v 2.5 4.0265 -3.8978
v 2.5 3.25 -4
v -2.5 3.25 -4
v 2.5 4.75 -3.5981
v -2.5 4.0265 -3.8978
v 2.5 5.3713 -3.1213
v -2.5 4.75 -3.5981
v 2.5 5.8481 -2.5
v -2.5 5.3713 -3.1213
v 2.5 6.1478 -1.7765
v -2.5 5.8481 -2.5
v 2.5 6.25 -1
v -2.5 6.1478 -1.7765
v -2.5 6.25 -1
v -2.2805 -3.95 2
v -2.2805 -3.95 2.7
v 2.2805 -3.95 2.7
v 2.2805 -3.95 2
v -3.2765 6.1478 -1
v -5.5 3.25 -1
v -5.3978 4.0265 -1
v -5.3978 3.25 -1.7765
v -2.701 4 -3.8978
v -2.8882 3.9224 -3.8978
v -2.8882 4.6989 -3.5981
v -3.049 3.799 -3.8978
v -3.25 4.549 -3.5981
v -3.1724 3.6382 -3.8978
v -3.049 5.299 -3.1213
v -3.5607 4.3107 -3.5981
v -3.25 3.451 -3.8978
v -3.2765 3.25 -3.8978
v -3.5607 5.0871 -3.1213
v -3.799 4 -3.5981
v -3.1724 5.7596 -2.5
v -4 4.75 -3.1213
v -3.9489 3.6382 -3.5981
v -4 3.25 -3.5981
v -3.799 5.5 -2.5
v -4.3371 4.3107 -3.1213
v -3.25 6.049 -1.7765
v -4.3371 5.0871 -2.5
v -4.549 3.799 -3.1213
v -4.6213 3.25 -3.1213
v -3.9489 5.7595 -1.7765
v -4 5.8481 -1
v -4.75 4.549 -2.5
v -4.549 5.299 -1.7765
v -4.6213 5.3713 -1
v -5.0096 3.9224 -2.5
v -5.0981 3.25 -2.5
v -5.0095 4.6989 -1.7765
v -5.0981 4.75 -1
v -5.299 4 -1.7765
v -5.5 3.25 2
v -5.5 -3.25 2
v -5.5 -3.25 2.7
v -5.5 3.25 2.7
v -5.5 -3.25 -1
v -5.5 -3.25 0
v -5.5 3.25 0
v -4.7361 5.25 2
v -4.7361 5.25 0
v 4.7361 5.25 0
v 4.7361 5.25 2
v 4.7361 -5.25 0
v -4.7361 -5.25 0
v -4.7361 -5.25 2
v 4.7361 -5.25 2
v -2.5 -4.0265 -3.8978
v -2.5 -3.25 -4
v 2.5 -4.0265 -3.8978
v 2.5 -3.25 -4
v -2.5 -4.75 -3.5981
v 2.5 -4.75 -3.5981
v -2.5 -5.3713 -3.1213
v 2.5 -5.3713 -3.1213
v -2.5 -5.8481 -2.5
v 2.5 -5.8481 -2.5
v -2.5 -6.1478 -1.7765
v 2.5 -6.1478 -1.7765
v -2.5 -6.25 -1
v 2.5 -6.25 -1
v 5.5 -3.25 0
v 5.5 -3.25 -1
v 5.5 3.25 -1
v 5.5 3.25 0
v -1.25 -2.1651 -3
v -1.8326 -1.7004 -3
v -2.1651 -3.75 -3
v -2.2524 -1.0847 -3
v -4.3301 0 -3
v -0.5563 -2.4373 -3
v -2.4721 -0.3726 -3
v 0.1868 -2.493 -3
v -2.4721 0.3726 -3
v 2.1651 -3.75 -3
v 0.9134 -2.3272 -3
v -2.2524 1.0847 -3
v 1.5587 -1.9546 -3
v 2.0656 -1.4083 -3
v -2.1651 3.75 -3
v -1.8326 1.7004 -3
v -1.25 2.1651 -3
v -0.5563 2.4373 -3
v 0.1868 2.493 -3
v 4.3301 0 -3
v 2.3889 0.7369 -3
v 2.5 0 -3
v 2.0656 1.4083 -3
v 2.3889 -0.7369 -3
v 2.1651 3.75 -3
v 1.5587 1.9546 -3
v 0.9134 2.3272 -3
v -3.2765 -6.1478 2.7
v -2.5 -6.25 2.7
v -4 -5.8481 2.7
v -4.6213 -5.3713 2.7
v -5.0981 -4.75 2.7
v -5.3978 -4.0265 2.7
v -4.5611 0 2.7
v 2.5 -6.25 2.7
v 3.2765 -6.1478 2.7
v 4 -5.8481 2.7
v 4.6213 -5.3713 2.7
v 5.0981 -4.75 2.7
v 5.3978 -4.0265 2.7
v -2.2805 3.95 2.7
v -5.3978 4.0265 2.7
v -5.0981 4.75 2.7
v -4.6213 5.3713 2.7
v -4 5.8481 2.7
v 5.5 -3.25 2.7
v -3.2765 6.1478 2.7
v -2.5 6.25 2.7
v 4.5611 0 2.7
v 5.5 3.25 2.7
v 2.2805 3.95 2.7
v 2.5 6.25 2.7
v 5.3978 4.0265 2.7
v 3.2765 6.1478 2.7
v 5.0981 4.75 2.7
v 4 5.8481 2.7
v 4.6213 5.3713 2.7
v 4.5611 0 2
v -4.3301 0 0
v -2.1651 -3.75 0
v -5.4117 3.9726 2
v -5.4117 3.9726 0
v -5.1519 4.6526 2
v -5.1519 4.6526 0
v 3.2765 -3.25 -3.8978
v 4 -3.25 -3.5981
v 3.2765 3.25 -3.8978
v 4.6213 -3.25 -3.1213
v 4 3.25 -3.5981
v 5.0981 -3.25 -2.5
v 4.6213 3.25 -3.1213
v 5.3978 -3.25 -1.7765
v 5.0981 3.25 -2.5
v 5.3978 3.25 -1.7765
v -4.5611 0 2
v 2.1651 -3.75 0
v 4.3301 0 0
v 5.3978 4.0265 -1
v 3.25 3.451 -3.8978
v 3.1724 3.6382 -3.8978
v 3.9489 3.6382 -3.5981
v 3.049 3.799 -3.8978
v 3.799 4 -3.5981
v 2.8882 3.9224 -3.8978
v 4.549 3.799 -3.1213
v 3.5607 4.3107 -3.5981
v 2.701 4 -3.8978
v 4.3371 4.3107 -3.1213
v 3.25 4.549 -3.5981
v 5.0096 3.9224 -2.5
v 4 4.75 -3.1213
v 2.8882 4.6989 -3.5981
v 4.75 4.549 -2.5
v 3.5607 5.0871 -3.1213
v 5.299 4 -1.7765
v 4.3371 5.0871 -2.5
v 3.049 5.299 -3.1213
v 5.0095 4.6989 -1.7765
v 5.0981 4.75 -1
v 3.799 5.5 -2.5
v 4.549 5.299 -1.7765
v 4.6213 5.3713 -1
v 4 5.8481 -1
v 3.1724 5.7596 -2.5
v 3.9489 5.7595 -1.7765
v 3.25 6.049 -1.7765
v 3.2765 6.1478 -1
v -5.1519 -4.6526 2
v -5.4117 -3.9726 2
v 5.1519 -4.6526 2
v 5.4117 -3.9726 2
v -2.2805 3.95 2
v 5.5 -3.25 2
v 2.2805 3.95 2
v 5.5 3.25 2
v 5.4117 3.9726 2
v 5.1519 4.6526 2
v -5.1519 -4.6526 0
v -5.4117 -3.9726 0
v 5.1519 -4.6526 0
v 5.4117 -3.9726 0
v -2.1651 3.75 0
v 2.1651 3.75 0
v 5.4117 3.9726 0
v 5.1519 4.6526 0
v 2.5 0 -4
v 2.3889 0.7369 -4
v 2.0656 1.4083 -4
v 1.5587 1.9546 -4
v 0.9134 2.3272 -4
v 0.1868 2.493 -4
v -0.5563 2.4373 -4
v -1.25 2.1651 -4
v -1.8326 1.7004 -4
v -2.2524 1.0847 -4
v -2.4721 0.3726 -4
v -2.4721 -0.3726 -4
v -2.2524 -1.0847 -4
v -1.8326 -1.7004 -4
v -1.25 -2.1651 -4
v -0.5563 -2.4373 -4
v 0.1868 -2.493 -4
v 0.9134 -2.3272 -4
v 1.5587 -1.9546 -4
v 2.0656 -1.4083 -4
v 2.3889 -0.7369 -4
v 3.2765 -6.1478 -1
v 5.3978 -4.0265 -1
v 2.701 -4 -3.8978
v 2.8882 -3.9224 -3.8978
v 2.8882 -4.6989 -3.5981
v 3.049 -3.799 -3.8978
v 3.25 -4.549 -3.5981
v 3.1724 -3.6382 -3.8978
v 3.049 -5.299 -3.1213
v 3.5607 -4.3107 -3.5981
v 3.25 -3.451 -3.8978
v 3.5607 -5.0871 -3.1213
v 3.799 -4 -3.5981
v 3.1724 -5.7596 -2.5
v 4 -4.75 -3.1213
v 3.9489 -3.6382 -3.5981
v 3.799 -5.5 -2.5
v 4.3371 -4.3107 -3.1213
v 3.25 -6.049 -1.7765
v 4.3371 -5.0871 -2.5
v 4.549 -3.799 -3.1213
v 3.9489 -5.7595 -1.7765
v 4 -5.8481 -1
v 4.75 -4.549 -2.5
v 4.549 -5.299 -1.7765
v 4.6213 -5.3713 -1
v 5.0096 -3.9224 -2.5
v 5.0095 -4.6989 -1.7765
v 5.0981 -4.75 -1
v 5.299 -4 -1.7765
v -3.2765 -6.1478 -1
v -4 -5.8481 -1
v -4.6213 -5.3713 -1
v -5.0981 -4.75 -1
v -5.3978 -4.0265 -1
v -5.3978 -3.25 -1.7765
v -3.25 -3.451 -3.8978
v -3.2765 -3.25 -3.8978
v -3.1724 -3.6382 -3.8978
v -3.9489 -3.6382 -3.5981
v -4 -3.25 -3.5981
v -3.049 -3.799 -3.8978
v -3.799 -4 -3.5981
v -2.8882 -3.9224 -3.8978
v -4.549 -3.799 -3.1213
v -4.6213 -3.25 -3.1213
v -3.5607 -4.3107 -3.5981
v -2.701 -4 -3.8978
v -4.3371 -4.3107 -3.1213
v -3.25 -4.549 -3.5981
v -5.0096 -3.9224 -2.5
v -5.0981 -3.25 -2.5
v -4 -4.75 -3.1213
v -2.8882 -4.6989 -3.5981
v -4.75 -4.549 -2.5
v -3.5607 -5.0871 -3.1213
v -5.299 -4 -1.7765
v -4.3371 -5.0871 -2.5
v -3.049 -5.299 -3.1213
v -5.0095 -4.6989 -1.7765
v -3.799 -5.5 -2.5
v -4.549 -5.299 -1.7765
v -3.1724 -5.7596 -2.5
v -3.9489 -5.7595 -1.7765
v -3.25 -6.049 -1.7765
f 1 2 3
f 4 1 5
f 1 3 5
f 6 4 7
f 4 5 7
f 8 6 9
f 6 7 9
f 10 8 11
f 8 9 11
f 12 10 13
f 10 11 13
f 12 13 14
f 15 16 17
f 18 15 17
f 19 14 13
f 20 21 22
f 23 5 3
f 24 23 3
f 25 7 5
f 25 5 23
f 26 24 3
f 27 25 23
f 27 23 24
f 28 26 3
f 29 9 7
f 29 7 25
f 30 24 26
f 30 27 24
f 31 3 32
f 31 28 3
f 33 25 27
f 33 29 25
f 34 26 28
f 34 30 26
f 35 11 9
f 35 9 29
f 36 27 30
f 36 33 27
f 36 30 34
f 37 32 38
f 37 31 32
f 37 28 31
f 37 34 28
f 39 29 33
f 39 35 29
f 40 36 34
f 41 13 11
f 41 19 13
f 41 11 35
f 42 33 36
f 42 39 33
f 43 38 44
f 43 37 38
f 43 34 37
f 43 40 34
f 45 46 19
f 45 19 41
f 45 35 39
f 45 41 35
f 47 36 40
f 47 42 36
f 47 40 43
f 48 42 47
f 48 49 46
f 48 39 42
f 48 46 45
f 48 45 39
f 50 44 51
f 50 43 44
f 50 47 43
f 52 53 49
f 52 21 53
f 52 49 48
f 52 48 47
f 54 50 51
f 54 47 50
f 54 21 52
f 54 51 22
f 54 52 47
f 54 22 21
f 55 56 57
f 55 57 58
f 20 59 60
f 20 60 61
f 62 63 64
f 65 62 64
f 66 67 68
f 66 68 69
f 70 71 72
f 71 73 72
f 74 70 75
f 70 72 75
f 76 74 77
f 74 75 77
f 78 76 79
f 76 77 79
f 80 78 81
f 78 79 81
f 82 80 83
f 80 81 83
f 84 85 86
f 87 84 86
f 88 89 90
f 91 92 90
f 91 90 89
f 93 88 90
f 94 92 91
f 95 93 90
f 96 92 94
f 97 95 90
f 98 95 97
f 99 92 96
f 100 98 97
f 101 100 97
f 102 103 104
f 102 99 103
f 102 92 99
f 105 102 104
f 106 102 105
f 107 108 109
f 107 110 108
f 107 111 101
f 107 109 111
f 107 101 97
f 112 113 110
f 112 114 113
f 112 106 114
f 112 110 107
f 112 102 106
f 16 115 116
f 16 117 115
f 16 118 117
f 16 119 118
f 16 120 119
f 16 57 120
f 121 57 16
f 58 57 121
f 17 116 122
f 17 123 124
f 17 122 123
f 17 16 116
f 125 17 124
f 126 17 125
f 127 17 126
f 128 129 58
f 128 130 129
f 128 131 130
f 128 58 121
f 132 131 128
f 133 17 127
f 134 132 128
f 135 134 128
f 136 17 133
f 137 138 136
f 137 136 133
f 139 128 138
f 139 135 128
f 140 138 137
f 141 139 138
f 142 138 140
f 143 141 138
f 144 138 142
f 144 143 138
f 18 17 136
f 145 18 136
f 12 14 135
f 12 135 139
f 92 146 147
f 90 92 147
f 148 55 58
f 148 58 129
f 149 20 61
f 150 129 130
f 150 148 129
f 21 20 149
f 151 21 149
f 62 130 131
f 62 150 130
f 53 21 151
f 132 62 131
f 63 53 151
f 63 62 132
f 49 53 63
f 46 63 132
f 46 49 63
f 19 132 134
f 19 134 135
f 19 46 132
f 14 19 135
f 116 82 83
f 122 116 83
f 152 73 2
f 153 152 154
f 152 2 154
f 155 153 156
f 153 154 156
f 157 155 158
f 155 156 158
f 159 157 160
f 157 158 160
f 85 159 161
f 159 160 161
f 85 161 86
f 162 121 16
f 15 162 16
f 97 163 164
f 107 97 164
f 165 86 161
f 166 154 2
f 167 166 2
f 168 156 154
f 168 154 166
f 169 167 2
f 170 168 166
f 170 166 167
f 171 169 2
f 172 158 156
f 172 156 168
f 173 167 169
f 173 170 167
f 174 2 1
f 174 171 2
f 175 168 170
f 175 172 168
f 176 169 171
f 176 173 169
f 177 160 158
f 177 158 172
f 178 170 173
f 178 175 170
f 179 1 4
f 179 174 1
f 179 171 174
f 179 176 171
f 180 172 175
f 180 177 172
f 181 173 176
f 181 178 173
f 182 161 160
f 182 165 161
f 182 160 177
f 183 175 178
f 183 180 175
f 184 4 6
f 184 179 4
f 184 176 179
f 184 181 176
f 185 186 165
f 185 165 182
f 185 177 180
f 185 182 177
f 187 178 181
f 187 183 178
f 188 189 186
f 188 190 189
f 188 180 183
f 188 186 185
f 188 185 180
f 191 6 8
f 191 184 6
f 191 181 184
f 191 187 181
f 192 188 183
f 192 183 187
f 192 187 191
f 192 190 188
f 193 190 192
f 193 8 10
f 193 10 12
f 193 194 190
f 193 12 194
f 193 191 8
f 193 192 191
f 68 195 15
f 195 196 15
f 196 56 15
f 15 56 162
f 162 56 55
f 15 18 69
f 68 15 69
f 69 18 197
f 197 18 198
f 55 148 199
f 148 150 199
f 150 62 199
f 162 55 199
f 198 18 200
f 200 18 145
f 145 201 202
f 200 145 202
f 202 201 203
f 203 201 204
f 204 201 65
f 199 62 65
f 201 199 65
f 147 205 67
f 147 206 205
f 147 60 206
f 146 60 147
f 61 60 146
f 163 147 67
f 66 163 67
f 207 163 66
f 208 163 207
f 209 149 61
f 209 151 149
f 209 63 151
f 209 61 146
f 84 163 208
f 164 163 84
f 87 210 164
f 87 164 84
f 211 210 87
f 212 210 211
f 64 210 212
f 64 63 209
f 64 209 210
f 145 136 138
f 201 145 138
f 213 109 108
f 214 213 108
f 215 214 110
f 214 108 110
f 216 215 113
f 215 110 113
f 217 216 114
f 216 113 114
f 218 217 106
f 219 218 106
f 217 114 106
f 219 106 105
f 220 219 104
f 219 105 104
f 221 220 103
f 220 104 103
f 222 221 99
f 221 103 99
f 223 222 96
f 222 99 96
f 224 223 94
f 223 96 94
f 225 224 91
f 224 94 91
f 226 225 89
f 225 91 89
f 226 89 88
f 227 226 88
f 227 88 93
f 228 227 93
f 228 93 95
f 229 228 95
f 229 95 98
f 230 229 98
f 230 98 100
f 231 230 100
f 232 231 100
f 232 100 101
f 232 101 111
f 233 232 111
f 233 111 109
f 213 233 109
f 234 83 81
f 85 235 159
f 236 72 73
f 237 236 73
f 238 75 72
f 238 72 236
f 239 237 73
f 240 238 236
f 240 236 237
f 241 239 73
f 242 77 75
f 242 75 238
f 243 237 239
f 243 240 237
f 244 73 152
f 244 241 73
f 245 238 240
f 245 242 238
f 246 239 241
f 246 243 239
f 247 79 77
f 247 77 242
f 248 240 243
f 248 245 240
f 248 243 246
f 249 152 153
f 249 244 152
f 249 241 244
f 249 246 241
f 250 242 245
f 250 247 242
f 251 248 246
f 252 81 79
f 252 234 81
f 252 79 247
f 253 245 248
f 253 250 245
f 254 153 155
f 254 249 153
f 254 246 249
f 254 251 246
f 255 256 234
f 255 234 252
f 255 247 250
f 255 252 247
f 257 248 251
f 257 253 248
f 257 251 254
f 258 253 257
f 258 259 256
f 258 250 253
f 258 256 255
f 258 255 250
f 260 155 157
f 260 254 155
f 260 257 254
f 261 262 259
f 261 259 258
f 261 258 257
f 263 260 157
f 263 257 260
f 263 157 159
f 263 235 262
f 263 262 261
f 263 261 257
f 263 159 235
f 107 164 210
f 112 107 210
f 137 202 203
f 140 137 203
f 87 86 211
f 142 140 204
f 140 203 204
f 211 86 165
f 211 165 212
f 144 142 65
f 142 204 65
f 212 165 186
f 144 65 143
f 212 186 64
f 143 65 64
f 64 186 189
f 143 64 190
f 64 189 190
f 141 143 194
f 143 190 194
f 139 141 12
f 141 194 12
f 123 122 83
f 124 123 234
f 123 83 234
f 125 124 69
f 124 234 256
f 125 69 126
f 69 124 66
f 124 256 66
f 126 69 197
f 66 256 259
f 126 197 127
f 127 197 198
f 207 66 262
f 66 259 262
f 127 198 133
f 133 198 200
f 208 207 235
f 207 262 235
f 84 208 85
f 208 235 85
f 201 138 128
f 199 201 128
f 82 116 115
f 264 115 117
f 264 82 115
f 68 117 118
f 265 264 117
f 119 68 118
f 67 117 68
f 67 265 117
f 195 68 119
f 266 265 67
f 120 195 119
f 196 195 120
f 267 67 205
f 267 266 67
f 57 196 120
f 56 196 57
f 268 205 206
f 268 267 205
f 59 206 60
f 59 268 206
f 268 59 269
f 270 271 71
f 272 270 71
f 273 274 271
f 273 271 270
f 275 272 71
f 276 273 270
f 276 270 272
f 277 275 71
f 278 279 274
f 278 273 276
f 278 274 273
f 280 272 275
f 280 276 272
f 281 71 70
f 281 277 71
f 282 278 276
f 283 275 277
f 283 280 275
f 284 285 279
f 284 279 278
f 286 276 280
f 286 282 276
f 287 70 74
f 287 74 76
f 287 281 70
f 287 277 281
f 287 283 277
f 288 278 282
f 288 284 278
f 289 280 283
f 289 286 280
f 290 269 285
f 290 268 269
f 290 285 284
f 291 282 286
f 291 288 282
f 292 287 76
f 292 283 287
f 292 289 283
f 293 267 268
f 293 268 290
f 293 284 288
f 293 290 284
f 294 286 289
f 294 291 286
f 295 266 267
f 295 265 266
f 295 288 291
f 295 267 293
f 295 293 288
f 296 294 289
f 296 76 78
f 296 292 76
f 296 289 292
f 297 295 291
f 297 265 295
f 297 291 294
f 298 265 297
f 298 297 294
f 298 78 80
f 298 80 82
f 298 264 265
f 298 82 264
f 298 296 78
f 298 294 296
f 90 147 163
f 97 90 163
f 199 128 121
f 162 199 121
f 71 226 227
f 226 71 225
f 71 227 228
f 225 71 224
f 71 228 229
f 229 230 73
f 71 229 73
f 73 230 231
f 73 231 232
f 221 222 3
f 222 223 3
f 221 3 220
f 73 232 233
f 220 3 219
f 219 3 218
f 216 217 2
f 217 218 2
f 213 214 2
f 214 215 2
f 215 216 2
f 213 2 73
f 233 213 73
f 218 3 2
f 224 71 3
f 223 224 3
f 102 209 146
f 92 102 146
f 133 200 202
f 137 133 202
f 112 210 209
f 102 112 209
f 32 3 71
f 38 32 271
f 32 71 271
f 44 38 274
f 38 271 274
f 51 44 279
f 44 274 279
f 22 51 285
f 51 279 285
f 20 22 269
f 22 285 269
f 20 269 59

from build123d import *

# Parameters (mm, degrees)
F0_W        = 11
F0_H        = 12.5
F0_R        = 2.5
F1_DEPTH    = 4
F2_R        = 2.5
F3_DEPTH    = 3
F4_W        = 11
F4_H        = 1
F5_DEPTH    = 2
F6_W        = 11
F6_H        = 12.5
F7_DEPTH    = 0.7
F8_DEPTH    = 25
F9_T1_DEPTH = 21.7
F11_DEPTH   = 2
F12_R       = 2.99999


# Not quite as in the source:
# - a fillet or chamfer that OpenCascade refuses, or shapes differently, is made with other operations: its cross-section is extruded or revolved along the edge and cut away or added
# - a fillet or chamfer is up to 0.001 mm smaller than in the source, because OpenCascade refuses the exact size


with BuildPart() as f1:
    # F0 (on Top) → F1 (new body)
    with BuildSketch(Plane.XY):
        Rectangle(F0_W, F0_H)
        Circle(F0_R, mode=Mode.SUBTRACT)
    extrude(amount=-F1_DEPTH)

    # F2 (on Top) → F3 (cut)
    with BuildSketch(Plane.XY):
        Polygon((2.1650635095, 3.75), (-2.1650635095, 3.75), (-4.3301270189, 0), (-2.1650635095, -3.75), (2.1650635095, -3.75), (4.3301270189, 0), align=None)
        Circle(F2_R, mode=Mode.SUBTRACT)
    extrude(amount=-F3_DEPTH, mode=Mode.SUBTRACT)

    # F4 (on face) → F5 (join)
    with BuildSketch(Plane.XY):
        with Locations((0, 5.75)):
            Rectangle(F4_W, F4_H)
        with Locations((0, -5.75)):
            Rectangle(F4_W, F4_H)
    extrude(amount=F5_DEPTH)

    # F6 (on face) → F7 (join)
    with BuildSketch(Plane.XY.offset(2)):
        Rectangle(F6_W, F6_H)
    extrude(amount=F7_DEPTH)

    # F2 (on Top) → F8 (cut)
    with BuildSketch(Plane.XY):
        Polygon((2.1650635095, 3.75), (-2.1650635095, 3.75), (-4.3301270189, 0), (-2.1650635095, -3.75), (2.1650635095, -3.75), (4.3301270189, 0), align=None)
        Circle(F2_R, mode=Mode.SUBTRACT)
        Circle(F2_R)
    extrude(amount=F8_DEPTH, mode=Mode.SUBTRACT)

    # F9: fillet of radius 3 on 4 edges, made by hand

    # F9_s2 → F9_t1 (cut)
    with BuildSketch(Plane.XY.offset(-11.5)):
        with BuildLine():
            ThreePointArc((-2.5, -6.25), (-4.6213203436, -5.3713203436), (-5.5, -3.25))
            Line((-5.5, -3.25), (-5.5, -6.25))
            Line((-5.5, -6.25), (-2.5, -6.25))
        make_face()
        with BuildLine():
            ThreePointArc((2.5, -6.25), (4.6213203436, -5.3713203436), (5.5, -3.25))
            Line((5.5, -3.25), (5.5, -6.25))
            Line((5.5, -6.25), (2.5, -6.25))
        make_face()
        with BuildLine():
            ThreePointArc((5.5, 3.25), (4.6213203436, 5.3713203436), (2.5, 6.25))
            Line((2.5, 6.25), (5.5, 6.25))
            Line((5.5, 6.25), (5.5, 3.25))
        make_face()
        with BuildLine():
            ThreePointArc((-5.5, 3.25), (-4.6213203436, 5.3713203436), (-2.5, 6.25))
            Line((-2.5, 6.25), (-5.5, 6.25))
            Line((-5.5, 6.25), (-5.5, 3.25))
        make_face()
    extrude(amount=F9_T1_DEPTH, mode=Mode.SUBTRACT)

    # F10 (on face) → F11 (cut)
    with BuildSketch(Plane.XY.offset(2.7)):
        Polygon((2.2805335633, 3.95), (-2.2805335633, 3.95), (-4.5610671266, 0), (-2.2805335633, -3.95), (2.2805335633, -3.95), (4.5610671266, 0), align=None)
    extrude(amount=-F11_DEPTH, mode=Mode.SUBTRACT)

    # F12 (radius 3 in the source; OpenCascade refuses exactly that, so slightly less here)
    f12_edges = [f1.edges().sort_by_distance(p)[0] for p in [
        (0, -6.25, -4),
    ]]
    fillet(f12_edges, radius=F12_R)


solid = f1.part
